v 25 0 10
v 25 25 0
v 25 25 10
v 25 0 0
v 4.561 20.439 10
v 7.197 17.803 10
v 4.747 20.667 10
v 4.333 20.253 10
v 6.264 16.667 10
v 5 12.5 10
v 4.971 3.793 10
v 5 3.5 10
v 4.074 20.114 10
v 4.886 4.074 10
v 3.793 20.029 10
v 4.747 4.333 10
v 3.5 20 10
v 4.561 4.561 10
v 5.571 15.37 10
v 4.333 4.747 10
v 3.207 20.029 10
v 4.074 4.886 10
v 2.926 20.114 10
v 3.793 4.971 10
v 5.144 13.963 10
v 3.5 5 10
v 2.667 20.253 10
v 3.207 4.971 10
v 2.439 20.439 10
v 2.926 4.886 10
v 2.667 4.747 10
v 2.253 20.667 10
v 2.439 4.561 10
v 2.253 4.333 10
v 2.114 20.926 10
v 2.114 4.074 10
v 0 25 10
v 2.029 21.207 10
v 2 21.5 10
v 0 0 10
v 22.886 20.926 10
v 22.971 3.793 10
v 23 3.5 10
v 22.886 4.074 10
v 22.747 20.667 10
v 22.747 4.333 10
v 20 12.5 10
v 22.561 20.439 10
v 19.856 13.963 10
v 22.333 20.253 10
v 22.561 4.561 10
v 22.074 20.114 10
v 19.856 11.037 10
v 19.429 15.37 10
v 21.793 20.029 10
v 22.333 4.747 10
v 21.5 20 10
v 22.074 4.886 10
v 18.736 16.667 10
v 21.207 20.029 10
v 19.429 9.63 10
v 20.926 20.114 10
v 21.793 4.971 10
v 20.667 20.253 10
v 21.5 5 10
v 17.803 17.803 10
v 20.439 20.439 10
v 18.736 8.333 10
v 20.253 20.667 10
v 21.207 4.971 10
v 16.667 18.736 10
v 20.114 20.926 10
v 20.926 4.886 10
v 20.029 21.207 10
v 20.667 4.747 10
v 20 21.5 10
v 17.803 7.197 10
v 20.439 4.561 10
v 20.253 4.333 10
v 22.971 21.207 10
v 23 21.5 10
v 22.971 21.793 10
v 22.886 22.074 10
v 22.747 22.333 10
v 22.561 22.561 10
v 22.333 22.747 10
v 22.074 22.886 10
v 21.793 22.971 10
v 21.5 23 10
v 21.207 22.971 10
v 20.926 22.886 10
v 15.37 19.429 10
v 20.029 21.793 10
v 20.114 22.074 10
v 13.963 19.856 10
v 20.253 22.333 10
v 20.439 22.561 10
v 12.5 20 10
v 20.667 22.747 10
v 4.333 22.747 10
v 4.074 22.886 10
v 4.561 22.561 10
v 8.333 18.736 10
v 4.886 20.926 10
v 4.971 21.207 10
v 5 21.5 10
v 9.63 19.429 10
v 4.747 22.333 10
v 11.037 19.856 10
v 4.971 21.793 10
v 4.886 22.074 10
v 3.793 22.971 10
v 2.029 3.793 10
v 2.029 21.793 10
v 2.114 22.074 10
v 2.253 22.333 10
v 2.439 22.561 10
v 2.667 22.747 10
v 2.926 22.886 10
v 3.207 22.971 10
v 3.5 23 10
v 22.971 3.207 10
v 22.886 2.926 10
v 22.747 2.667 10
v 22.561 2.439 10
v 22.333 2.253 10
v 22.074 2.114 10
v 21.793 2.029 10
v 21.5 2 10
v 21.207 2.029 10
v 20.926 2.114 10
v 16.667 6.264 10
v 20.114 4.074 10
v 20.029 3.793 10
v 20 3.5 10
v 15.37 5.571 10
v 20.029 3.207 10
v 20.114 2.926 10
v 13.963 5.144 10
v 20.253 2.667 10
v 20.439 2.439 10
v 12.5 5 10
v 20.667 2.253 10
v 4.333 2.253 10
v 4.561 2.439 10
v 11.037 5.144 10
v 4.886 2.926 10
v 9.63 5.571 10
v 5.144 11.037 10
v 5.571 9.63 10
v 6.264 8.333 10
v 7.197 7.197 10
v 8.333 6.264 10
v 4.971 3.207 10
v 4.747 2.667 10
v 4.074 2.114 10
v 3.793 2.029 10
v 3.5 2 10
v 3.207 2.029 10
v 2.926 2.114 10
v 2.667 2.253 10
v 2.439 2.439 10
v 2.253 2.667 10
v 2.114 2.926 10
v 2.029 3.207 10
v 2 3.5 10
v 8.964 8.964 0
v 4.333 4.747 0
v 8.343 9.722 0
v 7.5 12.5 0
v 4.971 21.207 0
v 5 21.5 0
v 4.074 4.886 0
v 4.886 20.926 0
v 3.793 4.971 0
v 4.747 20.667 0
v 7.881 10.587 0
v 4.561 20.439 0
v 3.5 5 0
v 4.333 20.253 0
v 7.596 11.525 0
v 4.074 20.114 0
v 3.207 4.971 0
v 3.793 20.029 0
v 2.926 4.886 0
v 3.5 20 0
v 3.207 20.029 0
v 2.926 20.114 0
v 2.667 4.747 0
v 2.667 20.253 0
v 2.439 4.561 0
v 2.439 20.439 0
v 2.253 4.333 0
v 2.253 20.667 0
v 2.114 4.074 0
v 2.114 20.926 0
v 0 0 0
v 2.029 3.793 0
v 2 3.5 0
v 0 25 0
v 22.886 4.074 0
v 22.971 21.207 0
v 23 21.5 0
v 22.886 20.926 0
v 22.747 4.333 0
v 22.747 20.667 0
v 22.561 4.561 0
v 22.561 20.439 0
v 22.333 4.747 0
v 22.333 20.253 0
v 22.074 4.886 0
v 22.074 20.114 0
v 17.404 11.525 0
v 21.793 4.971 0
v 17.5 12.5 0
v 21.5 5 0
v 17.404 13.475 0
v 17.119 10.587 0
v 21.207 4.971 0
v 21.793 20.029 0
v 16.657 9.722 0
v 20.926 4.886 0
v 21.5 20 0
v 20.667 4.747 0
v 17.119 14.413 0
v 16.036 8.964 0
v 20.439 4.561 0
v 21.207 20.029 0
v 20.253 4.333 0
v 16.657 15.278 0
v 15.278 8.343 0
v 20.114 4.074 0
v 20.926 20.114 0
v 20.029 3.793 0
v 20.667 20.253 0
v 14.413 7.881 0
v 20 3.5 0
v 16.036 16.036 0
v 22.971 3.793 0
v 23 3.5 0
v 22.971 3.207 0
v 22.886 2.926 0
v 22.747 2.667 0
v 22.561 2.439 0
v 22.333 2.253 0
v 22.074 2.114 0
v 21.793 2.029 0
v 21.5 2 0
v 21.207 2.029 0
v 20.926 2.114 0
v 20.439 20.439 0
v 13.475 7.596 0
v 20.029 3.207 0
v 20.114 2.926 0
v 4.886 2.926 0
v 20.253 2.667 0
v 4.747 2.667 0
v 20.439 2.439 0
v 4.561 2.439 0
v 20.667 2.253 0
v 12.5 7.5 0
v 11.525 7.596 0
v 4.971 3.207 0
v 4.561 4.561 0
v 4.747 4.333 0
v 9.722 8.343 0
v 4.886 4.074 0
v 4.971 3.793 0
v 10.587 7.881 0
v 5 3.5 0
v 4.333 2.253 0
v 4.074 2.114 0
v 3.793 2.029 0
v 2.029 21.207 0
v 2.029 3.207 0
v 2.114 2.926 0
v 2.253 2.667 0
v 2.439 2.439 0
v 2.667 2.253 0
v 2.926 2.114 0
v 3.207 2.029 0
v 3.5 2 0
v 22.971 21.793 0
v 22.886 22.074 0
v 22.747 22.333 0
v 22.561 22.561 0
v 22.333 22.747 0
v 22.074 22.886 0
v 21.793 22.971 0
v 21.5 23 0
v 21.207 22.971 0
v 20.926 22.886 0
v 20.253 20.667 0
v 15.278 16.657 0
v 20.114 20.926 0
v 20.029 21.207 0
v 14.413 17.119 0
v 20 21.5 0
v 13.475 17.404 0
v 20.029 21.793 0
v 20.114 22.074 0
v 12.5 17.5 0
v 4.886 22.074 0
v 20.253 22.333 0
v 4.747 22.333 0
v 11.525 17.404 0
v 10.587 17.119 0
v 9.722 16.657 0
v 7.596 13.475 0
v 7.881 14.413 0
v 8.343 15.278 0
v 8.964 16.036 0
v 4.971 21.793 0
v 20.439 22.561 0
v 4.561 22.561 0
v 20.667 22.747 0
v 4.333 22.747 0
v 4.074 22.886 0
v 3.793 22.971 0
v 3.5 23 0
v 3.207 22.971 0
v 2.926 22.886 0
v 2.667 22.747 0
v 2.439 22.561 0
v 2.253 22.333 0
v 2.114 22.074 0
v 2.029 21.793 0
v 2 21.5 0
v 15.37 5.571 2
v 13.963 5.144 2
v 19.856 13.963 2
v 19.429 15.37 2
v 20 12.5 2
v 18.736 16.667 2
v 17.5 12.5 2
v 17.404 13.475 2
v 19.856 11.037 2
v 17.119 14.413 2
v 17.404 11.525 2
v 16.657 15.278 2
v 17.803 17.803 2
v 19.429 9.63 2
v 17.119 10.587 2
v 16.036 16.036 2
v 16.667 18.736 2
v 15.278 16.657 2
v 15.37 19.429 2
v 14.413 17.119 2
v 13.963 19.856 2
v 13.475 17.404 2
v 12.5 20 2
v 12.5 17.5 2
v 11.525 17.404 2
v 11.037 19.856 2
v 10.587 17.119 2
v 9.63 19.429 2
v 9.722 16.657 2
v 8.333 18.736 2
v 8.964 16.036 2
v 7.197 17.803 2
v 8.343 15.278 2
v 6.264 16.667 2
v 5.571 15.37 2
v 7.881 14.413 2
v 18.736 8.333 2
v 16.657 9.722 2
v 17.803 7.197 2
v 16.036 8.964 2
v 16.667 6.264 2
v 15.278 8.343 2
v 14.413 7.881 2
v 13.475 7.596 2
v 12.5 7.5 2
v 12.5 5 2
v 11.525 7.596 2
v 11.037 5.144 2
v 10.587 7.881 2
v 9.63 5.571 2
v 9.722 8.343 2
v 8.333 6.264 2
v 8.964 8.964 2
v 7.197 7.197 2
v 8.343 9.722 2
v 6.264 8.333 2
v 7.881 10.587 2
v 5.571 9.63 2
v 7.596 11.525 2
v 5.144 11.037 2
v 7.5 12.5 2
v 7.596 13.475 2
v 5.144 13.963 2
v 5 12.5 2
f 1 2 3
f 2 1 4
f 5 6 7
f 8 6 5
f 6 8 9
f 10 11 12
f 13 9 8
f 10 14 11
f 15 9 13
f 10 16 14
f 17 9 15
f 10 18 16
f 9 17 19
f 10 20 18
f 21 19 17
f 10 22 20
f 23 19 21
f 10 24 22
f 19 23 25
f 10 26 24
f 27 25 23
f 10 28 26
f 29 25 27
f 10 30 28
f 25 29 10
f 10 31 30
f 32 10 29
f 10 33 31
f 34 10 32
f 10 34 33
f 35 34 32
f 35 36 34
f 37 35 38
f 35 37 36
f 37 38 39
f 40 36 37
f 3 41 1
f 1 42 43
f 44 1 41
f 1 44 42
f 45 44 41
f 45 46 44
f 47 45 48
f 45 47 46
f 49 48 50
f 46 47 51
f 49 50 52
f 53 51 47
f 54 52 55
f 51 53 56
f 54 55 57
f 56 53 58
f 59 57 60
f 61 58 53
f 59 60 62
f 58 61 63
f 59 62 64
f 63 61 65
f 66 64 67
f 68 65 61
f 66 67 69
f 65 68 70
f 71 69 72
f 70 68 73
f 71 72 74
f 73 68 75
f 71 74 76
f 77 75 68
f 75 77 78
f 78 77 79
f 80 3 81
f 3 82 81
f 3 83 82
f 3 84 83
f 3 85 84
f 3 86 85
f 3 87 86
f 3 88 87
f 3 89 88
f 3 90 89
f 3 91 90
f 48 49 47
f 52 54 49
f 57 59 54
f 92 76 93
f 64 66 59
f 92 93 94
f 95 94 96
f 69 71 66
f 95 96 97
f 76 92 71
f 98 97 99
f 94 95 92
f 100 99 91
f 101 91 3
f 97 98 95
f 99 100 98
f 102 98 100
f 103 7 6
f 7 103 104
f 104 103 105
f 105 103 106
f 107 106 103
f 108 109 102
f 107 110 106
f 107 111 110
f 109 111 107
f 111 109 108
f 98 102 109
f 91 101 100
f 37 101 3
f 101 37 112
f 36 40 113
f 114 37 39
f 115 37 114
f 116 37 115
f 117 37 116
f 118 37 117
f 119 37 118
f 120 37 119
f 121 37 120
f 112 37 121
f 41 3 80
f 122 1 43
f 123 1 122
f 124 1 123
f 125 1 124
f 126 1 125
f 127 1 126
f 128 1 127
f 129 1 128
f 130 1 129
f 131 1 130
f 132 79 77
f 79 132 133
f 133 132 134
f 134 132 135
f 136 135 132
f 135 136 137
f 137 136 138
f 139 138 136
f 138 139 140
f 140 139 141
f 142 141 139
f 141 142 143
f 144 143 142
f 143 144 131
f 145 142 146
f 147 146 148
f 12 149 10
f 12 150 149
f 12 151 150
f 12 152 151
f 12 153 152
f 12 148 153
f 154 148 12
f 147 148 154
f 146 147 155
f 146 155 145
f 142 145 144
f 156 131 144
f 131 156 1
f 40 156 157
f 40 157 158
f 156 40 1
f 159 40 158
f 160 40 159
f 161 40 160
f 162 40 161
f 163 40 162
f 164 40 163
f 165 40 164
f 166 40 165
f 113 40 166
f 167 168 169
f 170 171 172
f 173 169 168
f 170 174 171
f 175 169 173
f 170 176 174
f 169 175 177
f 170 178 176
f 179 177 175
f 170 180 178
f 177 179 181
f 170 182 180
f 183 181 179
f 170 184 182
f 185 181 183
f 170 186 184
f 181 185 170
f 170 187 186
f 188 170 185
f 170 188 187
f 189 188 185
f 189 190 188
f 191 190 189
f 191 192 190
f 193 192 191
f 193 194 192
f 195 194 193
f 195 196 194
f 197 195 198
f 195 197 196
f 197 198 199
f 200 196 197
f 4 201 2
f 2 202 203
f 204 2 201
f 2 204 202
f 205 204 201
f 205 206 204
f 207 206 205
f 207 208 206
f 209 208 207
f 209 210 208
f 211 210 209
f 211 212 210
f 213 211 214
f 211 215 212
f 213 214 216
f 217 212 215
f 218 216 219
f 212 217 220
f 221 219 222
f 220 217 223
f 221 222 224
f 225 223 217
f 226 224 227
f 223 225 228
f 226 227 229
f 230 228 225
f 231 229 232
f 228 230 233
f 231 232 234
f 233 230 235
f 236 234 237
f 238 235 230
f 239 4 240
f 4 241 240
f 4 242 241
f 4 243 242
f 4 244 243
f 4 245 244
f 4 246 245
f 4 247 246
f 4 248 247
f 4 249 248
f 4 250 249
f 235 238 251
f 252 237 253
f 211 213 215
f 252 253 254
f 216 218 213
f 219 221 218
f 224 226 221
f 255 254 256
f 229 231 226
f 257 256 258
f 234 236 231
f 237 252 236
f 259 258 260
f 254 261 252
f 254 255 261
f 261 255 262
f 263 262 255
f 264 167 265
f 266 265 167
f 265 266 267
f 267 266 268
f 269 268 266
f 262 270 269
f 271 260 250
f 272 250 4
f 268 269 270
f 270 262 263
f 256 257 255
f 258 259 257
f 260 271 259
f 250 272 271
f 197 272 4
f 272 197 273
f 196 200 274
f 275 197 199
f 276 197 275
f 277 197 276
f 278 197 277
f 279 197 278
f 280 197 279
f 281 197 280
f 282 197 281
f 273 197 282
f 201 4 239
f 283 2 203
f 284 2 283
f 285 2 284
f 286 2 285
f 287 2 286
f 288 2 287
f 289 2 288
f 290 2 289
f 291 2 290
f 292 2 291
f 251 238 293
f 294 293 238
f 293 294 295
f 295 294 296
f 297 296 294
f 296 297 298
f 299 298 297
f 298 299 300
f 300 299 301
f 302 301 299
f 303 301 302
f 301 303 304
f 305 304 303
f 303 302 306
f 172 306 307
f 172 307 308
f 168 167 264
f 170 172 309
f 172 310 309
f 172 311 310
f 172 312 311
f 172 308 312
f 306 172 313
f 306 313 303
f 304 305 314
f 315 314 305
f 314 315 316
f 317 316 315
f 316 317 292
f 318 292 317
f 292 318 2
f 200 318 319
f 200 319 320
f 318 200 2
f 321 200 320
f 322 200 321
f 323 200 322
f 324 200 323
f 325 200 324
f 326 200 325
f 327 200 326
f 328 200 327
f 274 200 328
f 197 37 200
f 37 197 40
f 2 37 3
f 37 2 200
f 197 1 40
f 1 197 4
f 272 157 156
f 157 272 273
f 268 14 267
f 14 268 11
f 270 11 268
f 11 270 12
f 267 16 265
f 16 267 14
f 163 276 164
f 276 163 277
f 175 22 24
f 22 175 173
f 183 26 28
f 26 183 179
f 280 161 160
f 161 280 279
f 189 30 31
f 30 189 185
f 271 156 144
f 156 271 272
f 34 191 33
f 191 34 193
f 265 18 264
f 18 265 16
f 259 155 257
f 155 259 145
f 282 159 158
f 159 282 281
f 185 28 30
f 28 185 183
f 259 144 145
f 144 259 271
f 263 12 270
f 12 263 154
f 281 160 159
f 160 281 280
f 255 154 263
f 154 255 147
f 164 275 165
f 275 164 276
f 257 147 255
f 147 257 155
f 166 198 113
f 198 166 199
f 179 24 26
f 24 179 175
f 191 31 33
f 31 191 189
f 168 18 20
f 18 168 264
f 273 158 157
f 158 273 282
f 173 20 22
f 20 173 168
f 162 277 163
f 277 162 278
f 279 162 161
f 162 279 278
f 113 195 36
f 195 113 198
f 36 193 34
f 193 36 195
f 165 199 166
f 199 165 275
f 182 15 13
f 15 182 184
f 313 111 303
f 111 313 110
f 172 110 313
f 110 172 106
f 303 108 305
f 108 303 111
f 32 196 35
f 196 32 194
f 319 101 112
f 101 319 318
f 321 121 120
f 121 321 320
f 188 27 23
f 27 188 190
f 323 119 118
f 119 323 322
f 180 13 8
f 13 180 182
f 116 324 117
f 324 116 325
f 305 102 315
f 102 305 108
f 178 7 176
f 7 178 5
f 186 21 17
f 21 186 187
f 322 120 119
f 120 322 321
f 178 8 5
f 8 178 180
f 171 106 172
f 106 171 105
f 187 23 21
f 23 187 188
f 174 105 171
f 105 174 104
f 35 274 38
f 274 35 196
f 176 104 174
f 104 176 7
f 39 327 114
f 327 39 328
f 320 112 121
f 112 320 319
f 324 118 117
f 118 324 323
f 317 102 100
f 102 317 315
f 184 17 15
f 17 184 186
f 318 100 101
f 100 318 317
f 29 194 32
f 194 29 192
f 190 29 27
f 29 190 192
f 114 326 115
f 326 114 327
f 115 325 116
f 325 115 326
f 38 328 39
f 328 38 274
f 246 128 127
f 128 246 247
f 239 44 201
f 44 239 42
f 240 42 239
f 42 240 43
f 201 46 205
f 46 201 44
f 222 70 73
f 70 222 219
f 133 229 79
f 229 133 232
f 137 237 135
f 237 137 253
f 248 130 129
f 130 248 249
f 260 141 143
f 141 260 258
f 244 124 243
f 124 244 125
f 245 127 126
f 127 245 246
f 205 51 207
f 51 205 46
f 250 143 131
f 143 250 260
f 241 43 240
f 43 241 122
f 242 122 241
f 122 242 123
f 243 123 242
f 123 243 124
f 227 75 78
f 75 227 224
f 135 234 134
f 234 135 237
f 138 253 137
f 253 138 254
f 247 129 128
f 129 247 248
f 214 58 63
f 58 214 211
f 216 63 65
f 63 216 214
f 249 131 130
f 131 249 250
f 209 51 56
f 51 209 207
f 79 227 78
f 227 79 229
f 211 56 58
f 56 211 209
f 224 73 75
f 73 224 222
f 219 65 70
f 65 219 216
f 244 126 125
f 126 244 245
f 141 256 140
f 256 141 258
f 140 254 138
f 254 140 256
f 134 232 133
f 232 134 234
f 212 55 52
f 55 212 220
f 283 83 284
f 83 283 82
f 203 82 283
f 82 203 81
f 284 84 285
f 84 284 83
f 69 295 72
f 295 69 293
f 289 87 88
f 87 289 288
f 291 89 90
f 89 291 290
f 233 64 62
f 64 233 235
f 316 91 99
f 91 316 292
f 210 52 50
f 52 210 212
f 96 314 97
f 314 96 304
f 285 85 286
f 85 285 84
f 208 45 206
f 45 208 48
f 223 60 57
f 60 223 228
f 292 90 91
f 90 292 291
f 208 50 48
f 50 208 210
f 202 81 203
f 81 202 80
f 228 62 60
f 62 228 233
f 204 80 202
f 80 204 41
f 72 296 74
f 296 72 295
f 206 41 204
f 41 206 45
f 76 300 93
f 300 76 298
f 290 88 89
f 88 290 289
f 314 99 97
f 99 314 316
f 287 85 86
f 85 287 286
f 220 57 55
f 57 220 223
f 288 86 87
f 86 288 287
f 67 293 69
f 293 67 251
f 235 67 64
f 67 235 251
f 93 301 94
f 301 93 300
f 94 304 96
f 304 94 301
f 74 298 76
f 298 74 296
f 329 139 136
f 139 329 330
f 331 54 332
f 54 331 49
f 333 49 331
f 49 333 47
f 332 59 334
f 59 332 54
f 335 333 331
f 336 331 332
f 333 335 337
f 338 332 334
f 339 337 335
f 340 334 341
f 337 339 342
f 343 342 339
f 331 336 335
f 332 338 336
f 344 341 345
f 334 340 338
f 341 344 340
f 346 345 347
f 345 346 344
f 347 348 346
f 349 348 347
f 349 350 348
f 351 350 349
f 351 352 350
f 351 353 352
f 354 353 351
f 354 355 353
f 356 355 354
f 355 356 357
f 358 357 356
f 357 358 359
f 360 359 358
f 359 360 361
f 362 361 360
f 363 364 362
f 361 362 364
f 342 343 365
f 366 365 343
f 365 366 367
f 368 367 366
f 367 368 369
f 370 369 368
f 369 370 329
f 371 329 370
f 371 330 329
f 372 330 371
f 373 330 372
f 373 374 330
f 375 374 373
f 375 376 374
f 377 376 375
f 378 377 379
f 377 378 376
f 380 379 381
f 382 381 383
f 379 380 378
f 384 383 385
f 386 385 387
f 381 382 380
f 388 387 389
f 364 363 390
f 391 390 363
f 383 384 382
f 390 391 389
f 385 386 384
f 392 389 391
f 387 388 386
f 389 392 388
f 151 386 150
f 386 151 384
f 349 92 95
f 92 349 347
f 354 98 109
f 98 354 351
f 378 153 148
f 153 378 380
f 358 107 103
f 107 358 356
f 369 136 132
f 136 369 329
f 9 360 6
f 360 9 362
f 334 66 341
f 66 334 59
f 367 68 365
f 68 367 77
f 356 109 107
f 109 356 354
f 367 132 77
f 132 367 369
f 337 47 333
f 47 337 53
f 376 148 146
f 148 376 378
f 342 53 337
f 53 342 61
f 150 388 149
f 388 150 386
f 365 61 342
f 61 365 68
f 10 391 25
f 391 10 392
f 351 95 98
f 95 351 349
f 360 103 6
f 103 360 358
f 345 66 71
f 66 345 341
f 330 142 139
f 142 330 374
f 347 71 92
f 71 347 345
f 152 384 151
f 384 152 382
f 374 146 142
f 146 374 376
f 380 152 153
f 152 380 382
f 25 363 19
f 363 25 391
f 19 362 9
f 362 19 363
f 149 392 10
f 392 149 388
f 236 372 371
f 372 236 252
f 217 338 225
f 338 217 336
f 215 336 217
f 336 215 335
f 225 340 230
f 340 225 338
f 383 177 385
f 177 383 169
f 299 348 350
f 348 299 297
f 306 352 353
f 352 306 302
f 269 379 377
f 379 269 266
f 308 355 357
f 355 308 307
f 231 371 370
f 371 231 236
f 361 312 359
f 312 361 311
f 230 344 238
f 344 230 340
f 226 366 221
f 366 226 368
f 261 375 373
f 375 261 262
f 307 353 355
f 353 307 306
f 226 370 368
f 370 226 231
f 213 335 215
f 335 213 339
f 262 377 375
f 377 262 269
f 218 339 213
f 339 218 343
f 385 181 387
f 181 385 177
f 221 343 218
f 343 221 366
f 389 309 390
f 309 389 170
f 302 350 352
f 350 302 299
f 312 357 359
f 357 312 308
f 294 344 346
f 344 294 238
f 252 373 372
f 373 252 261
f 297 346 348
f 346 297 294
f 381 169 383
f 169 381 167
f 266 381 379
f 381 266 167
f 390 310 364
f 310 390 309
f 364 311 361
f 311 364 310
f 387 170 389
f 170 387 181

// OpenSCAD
$fa = 1;
$fs = 0.4;
$fn = 32;

module blocchetto_laser() {
    difference() {
        cube([25, 25, 10]);    
        
        translate([3.5, 3.5, 0])
            cylinder(30, 1.5, 1.5, center = true);
        translate([3.5, 21.5, 0])
            cylinder(30, 1.5, 1.5, center = true);
        translate([21.5, 3.5, 0])
            cylinder(30, 1.5, 1.5, center = true);
        translate([21.5, 21.5, 0])
            cylinder(30, 1.5, 1.5, center = true);
        translate([12.5, 12.5, 2])
            cylinder(30, 7.5, 7.5);
        translate([12.5, 12.5, -1])
            cylinder(30, 5, 5);
    }
}

blocchetto_laser();
